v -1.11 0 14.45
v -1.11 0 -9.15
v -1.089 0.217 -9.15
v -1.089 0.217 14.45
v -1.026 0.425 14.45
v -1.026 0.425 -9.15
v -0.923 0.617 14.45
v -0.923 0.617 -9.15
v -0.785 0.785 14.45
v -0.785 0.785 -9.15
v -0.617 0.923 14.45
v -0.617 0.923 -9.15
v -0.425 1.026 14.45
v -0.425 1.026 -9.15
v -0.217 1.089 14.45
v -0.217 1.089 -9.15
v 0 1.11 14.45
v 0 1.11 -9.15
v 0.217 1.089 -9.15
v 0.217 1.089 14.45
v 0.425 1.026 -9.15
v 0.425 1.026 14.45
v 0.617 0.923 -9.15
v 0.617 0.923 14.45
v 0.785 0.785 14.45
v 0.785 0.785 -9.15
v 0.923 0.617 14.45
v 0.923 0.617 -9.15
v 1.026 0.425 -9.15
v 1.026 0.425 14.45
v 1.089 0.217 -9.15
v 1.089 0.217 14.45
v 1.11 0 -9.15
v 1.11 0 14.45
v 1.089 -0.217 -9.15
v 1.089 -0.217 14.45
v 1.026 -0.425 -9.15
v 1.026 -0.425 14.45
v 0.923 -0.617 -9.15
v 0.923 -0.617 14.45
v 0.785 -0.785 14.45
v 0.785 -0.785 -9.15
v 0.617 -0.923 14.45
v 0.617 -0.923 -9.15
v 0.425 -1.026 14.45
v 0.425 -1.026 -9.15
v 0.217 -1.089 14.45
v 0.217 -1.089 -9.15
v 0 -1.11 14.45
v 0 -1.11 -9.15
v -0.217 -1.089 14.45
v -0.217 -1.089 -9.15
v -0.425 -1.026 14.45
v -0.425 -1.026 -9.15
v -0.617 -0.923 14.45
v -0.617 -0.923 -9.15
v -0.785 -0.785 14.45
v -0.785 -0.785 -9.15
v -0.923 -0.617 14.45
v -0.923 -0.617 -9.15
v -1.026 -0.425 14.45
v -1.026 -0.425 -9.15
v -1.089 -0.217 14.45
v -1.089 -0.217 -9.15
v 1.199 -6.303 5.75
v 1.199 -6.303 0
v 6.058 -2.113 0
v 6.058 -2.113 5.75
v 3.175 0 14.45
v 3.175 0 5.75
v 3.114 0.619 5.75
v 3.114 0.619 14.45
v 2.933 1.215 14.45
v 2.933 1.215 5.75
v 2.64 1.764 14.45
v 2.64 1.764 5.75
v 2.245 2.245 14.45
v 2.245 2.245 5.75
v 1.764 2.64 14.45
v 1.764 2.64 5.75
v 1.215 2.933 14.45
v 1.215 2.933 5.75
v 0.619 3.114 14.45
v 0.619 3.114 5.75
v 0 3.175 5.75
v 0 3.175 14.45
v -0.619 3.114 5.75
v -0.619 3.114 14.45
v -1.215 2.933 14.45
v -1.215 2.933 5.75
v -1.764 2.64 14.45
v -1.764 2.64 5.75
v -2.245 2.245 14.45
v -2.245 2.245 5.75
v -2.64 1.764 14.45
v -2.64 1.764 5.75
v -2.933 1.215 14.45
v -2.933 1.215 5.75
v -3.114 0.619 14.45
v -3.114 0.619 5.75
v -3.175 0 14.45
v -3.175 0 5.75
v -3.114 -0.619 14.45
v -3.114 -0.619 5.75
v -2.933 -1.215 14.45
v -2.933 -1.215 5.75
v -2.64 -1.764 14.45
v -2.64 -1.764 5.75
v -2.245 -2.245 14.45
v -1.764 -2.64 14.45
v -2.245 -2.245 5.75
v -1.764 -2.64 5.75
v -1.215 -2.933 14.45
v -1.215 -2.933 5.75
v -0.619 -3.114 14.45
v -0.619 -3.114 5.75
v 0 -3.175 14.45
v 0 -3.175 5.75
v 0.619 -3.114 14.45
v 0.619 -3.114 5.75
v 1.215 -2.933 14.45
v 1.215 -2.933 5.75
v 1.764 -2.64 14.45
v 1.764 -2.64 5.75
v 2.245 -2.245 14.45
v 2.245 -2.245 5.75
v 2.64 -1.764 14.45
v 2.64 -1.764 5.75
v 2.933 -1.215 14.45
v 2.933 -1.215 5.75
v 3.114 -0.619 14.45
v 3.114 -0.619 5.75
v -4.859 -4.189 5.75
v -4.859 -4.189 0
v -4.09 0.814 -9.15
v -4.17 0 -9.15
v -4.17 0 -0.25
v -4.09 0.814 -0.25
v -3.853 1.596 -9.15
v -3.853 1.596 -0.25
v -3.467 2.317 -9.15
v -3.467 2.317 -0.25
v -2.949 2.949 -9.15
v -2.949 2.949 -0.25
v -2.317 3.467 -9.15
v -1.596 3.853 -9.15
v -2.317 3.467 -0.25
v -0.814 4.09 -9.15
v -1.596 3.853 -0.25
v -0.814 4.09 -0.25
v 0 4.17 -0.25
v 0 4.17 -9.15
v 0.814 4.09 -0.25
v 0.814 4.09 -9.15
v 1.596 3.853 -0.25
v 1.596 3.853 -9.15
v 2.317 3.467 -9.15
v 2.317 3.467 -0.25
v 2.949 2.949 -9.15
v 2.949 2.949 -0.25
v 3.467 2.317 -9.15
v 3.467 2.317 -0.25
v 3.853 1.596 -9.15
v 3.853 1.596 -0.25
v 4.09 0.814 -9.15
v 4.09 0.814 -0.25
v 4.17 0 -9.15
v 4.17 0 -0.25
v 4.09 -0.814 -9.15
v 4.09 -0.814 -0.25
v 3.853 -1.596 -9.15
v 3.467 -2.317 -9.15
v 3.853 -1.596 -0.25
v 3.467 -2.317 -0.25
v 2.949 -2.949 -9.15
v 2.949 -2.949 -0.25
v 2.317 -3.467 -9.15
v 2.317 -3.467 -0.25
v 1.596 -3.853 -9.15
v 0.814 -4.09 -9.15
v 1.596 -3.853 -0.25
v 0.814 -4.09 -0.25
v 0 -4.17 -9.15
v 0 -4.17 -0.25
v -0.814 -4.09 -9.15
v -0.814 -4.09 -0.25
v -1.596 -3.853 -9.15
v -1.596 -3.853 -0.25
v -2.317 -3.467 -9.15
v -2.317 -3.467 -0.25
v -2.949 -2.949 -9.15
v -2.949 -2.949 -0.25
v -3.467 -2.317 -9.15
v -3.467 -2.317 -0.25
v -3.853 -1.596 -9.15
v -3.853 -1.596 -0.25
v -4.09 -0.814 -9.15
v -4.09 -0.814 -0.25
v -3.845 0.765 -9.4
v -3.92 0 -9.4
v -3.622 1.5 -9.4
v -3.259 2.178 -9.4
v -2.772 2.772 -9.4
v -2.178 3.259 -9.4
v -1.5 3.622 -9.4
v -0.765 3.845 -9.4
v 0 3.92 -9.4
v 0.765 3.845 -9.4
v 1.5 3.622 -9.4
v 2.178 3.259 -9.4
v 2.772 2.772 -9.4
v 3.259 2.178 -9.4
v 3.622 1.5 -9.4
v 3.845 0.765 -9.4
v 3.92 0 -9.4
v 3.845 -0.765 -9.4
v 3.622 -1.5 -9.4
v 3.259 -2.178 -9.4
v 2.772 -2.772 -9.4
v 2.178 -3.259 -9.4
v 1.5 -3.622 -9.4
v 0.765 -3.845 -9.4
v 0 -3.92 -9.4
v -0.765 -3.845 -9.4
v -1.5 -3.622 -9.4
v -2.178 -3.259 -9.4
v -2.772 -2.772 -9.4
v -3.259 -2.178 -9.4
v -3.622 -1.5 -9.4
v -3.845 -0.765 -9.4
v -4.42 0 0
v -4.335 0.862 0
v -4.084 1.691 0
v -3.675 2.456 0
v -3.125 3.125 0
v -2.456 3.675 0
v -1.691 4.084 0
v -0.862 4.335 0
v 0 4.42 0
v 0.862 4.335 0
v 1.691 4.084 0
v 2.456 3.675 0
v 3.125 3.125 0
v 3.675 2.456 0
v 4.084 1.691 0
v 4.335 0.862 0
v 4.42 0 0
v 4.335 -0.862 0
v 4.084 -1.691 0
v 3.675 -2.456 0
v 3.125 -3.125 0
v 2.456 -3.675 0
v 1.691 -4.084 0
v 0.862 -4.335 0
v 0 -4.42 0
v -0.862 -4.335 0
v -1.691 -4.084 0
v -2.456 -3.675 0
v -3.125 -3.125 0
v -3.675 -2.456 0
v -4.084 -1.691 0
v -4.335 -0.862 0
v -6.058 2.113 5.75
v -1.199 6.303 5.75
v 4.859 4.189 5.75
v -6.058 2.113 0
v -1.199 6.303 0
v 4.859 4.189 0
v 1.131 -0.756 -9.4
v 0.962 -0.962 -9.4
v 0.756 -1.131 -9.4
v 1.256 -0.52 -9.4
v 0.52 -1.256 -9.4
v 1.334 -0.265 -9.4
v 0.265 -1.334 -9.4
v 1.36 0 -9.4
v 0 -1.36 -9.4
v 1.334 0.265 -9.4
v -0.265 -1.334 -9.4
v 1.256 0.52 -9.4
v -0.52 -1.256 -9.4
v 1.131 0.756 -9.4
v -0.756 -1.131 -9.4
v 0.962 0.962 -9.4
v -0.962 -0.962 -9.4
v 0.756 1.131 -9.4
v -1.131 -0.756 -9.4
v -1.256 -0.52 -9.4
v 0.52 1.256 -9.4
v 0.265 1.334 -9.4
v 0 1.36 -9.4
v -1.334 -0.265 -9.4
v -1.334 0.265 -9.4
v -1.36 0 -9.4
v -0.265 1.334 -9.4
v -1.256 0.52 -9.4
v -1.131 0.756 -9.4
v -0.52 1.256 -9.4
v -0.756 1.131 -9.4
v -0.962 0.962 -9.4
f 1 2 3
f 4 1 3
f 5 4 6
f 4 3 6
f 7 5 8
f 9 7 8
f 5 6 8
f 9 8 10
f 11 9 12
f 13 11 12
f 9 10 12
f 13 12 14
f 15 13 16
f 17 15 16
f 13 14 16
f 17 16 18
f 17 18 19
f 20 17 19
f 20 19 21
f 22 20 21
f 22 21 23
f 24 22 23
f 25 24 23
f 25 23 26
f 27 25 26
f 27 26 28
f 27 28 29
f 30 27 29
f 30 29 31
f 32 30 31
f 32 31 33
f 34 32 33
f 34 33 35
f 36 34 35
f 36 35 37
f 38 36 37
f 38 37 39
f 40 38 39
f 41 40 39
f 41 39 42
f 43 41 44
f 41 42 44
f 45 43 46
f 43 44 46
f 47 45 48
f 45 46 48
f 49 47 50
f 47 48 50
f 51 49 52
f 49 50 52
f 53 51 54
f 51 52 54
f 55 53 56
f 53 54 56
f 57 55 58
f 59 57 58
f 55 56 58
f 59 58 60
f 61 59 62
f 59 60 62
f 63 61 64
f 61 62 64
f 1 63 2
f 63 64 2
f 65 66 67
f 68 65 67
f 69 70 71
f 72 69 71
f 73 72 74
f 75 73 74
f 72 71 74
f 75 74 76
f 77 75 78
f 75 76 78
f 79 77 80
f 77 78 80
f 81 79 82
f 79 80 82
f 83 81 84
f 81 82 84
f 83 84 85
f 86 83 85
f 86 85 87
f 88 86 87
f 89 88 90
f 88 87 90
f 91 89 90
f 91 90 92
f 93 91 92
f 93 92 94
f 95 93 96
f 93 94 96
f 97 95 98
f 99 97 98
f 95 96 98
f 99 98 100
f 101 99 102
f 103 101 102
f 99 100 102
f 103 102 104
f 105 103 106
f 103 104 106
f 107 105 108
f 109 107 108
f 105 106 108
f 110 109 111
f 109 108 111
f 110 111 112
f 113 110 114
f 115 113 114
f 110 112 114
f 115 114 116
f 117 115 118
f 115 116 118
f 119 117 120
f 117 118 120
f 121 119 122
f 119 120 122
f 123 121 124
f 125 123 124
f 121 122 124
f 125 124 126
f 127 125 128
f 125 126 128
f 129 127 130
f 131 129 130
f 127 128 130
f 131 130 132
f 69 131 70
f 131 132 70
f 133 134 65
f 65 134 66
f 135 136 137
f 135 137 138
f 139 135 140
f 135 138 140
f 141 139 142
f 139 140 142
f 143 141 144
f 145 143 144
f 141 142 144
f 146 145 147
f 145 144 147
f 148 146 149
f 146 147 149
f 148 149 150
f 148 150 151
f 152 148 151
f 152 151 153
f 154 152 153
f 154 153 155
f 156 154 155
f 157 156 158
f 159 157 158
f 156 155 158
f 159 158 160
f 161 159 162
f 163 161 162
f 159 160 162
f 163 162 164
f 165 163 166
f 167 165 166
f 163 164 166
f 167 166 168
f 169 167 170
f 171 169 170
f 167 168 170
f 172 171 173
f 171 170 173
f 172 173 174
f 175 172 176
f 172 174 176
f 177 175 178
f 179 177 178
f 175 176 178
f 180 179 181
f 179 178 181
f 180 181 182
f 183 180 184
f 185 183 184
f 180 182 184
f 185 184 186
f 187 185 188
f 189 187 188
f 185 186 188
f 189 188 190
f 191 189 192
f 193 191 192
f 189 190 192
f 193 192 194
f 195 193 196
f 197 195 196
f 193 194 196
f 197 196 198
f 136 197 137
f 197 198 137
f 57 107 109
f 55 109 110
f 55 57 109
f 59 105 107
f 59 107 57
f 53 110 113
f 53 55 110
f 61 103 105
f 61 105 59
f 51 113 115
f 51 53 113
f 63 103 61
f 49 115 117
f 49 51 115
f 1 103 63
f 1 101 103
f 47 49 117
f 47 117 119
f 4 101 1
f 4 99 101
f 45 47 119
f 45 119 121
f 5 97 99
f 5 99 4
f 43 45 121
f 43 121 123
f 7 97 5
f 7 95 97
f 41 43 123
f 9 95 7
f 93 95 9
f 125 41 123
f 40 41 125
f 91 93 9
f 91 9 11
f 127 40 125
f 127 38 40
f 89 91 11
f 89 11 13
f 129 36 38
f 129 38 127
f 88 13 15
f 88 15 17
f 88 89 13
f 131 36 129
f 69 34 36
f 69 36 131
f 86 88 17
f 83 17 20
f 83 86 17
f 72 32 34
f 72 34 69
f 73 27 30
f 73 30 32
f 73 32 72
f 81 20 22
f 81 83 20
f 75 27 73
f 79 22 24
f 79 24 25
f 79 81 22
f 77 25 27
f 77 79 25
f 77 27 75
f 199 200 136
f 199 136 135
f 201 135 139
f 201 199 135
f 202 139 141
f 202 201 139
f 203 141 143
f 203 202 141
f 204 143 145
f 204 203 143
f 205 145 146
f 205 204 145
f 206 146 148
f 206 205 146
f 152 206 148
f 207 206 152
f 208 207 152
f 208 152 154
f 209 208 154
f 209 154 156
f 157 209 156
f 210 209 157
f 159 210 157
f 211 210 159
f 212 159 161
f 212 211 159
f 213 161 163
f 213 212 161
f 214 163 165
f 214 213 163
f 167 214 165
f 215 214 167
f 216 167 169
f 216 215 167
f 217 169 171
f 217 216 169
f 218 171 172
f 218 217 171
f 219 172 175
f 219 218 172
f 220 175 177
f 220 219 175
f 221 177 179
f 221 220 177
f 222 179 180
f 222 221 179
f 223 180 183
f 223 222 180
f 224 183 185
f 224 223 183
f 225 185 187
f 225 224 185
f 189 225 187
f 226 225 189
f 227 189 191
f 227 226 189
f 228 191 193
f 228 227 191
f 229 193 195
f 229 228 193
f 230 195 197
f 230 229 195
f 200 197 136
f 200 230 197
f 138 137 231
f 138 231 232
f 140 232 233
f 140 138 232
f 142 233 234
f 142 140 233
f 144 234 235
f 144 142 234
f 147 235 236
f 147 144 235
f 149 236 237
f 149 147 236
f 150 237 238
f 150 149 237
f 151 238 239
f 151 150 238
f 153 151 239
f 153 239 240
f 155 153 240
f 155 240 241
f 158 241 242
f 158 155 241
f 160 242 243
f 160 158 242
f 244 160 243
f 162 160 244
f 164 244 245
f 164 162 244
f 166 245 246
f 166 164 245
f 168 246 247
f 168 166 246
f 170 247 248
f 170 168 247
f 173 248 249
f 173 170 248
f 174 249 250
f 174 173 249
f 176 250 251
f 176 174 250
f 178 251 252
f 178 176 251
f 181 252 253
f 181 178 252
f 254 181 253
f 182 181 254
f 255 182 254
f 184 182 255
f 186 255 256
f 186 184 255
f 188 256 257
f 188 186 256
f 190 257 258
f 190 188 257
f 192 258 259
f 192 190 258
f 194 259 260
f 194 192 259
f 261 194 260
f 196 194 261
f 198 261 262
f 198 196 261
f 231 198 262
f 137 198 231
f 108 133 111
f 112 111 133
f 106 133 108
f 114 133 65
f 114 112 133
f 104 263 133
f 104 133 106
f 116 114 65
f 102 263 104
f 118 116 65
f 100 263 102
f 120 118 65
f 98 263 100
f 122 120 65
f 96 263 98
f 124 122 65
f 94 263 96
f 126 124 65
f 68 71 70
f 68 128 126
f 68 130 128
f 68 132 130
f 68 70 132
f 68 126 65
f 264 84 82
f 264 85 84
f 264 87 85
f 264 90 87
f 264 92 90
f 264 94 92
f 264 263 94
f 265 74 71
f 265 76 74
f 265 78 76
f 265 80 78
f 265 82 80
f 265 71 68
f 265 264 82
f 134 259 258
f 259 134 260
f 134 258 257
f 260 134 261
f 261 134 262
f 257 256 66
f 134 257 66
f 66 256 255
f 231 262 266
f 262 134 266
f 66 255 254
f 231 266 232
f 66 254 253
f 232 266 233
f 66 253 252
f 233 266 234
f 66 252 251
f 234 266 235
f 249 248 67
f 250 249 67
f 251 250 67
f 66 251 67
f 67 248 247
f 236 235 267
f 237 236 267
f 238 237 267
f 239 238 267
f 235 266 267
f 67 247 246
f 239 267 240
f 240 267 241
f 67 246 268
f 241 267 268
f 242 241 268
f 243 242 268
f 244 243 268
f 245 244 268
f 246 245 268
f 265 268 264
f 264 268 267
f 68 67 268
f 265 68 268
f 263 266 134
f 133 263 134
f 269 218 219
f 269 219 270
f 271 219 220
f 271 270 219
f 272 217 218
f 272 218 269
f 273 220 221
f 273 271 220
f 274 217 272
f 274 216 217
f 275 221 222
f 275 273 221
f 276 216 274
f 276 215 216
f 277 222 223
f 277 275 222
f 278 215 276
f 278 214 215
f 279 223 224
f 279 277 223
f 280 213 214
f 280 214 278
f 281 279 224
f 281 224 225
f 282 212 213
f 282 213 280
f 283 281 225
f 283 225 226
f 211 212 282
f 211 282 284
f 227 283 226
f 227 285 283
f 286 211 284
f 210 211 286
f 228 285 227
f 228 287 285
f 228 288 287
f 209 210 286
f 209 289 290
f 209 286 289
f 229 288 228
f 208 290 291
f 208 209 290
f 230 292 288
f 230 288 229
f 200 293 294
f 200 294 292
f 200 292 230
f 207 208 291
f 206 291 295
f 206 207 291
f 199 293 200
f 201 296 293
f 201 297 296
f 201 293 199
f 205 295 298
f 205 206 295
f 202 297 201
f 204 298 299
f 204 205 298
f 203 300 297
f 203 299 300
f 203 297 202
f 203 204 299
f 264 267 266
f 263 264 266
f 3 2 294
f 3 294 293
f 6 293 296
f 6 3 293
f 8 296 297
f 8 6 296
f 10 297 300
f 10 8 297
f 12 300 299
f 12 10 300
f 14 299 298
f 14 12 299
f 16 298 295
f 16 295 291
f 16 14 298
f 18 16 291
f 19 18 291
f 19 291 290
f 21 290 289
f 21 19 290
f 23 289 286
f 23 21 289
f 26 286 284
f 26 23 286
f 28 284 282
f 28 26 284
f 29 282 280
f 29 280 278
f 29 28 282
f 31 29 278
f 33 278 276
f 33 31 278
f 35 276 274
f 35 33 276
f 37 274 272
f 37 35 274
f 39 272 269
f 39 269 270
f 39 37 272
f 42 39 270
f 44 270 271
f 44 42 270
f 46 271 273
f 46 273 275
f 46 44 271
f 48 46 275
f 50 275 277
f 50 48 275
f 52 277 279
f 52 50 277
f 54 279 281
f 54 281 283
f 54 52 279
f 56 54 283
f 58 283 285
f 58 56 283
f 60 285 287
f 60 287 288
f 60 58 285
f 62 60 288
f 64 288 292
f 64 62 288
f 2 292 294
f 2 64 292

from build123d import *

# Parameters (mm, degrees)
SALIENTE_EXTRUIR1_DEPTH = 5.75
CROQUIS3_R              = 3.175
SALIENTE_EXTRUIR2_DEPTH = 8.7
CROQUIS5_R              = 4.17
SALIENTE_EXTRUIR3_DEPTH = 9.4
CROQUIS6_R              = 1.11
CORTAR_EXTRUIR1_DEPTH   = 24.85
CHAFL_N1_SIZE           = 0.25


with BuildPart() as part:
    # Croquis2 → Saliente-Extruir1 (new body)
    with BuildSketch(Plane.XY):
        Polygon((4.859109949, 4.189463282), (-1.198626656, 6.302844296), (-6.057736605, 2.113381014), (-4.859109949, -4.189463282), (1.198626656, -6.302844296), (6.057736605, -2.113381014), align=None)
    extrude(amount=SALIENTE_EXTRUIR1_DEPTH)

    # Croquis3 → Saliente-Extruir2 (add)
    with BuildSketch(Plane.XY.offset(5.75)):
        Circle(CROQUIS3_R)
    extrude(amount=SALIENTE_EXTRUIR2_DEPTH)

    # Croquis5 → Saliente-Extruir3 (add)
    with BuildSketch(Plane(origin=(0, 0, 0), x_dir=(-1, 0, 0), z_dir=(0, 0, -1))):
        Circle(CROQUIS5_R)
    extrude(amount=SALIENTE_EXTRUIR3_DEPTH)

    # Croquis6 → Cortar-Extruir1 (cut, through all)
    with BuildSketch(Plane(origin=(0, 0, -9.4), x_dir=(-1, 0, 0), z_dir=(0, 0, -1))):
        Circle(CROQUIS6_R)
    extrude(amount=-CORTAR_EXTRUIR1_DEPTH, mode=Mode.SUBTRACT)

    # Chaflán1
    chafl_n1_edges = [part.edges().sort_by_distance(p)[0] for p in [
        (4.17, 0, 0),
        (4.17, 0, -9.4),
        (1.11, 0, -9.4),
    ]]
    chamfer(chafl_n1_edges, length=CHAFL_N1_SIZE)


solid = part.part
